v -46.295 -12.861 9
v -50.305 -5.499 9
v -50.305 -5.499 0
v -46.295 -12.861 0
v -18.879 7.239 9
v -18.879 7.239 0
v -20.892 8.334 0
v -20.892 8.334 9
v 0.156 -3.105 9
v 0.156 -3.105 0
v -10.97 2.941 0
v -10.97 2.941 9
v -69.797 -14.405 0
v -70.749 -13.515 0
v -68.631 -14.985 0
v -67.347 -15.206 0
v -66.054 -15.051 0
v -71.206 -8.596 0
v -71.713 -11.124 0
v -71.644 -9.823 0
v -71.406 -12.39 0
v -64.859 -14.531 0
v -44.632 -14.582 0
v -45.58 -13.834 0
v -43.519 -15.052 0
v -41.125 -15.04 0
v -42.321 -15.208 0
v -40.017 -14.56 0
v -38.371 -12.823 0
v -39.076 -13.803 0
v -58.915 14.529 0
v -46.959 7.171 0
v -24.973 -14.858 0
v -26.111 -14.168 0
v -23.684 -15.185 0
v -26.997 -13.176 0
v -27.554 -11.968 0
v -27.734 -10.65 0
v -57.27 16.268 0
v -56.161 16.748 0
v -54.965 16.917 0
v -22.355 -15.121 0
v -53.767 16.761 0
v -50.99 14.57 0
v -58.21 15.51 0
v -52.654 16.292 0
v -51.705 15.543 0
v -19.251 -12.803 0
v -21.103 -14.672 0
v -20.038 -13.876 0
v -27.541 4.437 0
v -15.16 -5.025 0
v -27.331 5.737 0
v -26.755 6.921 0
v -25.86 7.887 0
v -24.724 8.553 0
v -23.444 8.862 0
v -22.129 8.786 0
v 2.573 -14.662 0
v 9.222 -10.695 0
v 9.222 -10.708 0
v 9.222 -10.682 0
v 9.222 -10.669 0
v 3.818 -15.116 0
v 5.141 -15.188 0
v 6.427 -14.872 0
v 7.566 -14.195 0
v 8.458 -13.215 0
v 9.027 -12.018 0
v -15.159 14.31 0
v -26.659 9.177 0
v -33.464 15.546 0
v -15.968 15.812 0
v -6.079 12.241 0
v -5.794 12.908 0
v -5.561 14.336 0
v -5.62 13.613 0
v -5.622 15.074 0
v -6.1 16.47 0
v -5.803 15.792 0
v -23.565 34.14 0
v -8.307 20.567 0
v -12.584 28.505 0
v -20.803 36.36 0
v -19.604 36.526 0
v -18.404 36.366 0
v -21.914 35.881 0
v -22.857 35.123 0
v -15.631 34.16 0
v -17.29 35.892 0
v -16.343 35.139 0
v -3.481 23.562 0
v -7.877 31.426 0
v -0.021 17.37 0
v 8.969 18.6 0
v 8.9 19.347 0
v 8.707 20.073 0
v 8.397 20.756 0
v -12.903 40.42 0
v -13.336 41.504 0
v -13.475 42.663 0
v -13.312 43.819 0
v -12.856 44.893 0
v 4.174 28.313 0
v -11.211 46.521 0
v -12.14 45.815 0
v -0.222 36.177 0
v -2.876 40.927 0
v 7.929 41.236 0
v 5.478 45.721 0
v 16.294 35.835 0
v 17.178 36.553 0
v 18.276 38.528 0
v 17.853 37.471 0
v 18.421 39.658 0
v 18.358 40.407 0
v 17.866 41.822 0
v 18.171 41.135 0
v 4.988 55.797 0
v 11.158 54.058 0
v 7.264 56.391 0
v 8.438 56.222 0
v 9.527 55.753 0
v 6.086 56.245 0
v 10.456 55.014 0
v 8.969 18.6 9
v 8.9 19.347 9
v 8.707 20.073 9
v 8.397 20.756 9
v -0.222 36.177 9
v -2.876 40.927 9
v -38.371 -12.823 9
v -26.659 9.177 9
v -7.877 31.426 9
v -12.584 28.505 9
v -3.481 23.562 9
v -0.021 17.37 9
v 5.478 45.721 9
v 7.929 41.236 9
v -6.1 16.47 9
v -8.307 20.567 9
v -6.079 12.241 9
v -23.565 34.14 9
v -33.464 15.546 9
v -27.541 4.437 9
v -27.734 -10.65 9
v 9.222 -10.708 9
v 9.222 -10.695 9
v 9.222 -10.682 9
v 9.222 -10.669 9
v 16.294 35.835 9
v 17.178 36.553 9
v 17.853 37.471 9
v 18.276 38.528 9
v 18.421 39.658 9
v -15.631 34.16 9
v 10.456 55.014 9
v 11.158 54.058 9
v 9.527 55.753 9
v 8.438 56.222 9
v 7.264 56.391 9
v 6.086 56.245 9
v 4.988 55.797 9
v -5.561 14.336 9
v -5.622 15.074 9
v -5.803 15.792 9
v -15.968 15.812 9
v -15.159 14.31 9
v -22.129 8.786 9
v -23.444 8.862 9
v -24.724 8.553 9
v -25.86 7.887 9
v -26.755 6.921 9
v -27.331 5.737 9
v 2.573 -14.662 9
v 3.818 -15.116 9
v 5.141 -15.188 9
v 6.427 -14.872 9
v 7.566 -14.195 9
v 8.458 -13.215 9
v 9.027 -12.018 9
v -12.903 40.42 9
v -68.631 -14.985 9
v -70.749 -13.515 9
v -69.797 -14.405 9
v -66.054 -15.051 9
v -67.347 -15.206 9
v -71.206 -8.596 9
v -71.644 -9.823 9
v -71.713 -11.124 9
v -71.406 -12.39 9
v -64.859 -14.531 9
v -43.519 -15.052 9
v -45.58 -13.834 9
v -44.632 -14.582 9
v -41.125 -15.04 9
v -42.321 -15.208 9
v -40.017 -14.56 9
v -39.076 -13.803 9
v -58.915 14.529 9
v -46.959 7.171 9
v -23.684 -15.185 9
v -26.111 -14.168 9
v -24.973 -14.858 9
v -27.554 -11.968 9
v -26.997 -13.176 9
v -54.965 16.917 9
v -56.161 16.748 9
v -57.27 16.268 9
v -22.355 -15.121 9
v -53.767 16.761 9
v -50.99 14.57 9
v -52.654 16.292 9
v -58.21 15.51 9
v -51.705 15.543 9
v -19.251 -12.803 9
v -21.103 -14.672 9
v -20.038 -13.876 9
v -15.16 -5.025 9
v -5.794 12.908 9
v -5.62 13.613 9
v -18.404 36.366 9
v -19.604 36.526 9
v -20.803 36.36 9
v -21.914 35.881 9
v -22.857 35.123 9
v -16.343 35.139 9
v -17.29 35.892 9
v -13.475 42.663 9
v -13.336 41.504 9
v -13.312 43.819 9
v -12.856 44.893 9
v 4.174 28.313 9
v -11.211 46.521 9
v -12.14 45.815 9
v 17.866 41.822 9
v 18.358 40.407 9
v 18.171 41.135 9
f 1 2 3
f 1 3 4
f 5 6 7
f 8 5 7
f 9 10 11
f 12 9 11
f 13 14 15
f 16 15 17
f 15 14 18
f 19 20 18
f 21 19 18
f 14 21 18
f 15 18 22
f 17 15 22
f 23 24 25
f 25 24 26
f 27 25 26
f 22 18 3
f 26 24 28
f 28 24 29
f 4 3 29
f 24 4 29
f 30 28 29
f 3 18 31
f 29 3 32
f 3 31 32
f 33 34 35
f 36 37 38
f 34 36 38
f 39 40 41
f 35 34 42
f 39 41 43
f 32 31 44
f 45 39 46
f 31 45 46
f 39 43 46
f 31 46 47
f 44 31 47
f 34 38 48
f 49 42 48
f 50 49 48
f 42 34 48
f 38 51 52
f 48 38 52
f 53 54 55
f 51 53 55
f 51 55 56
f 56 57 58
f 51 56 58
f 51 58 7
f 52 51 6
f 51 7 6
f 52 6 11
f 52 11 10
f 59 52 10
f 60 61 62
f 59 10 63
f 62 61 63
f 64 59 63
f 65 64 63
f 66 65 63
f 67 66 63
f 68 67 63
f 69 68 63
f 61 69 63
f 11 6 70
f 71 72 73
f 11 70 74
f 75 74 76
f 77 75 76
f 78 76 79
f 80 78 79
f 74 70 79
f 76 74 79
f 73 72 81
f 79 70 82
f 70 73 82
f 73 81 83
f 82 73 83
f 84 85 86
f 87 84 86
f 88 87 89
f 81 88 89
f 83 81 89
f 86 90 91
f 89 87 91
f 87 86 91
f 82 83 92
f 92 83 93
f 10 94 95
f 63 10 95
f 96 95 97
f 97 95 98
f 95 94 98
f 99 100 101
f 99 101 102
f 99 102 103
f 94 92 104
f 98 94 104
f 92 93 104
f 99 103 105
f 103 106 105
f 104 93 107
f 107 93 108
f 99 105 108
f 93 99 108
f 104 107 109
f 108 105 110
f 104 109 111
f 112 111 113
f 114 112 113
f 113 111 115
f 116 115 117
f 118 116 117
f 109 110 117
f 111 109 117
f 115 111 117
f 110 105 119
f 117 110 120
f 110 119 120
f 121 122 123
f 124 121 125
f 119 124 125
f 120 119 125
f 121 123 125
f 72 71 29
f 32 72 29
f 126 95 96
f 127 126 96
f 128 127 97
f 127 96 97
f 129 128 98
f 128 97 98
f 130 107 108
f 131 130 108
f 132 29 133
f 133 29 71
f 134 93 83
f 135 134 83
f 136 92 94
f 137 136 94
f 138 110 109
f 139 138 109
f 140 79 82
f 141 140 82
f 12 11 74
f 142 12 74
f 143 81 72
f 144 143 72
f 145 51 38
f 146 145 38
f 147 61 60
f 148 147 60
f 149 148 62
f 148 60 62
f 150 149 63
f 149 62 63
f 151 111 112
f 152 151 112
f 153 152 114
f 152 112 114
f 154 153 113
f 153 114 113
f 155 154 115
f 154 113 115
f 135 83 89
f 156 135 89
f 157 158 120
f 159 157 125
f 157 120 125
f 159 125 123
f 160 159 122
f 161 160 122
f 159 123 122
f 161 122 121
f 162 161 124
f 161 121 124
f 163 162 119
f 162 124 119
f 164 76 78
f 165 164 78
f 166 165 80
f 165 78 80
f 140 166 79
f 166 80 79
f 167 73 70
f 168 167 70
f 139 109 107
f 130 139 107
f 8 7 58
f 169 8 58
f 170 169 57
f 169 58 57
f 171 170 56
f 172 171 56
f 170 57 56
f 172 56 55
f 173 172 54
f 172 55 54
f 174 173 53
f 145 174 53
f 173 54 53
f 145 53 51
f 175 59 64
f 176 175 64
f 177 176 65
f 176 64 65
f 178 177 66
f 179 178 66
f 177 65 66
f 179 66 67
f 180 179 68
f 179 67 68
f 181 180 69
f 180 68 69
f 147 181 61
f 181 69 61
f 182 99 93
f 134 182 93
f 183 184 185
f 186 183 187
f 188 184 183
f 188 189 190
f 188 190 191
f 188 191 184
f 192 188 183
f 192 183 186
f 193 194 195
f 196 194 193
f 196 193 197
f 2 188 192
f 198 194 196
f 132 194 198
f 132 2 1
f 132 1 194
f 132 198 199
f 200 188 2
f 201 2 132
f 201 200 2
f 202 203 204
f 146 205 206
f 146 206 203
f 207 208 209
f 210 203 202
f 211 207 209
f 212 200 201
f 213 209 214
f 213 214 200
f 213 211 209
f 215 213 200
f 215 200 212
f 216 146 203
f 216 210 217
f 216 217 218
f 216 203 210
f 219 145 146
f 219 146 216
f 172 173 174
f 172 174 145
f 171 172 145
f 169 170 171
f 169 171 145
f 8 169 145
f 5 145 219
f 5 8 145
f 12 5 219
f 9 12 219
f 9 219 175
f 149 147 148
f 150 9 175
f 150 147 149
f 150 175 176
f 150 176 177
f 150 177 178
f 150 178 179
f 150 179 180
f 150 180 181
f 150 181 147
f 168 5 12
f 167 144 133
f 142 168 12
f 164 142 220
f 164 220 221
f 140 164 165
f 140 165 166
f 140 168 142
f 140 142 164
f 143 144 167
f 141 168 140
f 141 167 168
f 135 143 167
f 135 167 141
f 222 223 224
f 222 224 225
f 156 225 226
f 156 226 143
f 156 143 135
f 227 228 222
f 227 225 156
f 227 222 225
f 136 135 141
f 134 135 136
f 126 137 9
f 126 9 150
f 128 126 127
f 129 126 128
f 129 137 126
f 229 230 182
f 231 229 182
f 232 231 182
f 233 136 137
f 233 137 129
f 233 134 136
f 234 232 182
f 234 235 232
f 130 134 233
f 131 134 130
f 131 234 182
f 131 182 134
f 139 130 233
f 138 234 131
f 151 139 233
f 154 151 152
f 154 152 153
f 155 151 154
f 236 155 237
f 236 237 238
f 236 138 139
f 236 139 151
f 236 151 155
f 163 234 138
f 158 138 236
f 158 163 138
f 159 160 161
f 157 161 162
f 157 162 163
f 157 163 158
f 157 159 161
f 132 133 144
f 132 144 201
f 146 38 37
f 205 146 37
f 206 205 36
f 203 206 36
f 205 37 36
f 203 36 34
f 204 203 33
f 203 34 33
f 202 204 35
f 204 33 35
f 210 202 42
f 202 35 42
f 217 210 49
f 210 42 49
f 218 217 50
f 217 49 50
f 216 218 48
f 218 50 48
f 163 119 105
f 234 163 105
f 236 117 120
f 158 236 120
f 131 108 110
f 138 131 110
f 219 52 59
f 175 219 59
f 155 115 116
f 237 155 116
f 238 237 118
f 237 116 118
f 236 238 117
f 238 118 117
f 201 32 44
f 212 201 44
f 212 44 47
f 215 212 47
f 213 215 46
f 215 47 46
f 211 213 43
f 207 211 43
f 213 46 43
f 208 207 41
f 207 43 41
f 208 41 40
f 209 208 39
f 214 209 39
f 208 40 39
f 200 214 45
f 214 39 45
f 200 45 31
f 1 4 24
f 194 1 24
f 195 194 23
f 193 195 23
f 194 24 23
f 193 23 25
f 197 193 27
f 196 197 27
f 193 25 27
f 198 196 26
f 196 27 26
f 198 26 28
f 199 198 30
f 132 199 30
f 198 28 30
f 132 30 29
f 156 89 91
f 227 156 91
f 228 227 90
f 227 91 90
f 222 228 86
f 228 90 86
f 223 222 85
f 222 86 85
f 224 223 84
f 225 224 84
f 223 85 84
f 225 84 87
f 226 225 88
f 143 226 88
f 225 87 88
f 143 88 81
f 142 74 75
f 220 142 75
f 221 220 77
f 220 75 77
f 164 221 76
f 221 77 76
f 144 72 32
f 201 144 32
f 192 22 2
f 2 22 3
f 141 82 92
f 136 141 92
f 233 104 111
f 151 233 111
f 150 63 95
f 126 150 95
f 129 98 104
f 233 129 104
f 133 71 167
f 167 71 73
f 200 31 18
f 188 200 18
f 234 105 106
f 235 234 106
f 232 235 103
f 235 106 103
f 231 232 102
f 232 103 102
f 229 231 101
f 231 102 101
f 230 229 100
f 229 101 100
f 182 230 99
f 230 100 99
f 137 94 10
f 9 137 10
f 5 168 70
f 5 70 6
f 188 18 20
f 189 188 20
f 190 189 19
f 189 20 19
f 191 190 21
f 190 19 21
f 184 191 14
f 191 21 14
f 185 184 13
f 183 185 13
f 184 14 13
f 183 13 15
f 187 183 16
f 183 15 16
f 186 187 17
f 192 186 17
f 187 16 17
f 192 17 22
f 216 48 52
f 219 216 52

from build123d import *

# Parameters (mm, degrees)
F1_DEPTH = 9


with BuildPart() as f1:
    # F0 (on Top) → F1 (new body)
    with BuildSketch(Plane.XY):
        with BuildLine():
            ThreePointArc((-69.6048887702, -6.8844657511), (-70.5185796828, -7.6342220802), (-71.2055353566, -8.596021196))
            ThreePointArc((-71.2055353566, -8.596021196), (-70.3056022489, -13.9946183424), (-64.8588968993, -14.5313972377))
            ThreePointArc((-64.8588968993, -14.5313972377), (-63.9452059866, -13.7816409086), (-63.2582503128, -12.8198417928))
            ThreePointArc((-63.2582503128, -12.8198417928), (-62.8654645834, -11.7961889666), (-62.7318928347, -10.7079314944))
            ThreePointArc((-62.7318928347, -10.7079314944), (-65.0442550344, -6.7754715957), (-69.6048887702, -6.8844657511))
        make_face()
        with BuildLine():
            Line((-63.2582503128, -12.8198417928), (-55.4270514125, 1.9148678069))
            Line((-55.4270514125, 1.9148678069), (-69.6048887702, -6.8844657511))
            ThreePointArc((-69.6048887702, -6.8844657511), (-65.0442550344, -6.7754715957), (-62.7318928347, -10.7079314944))
            ThreePointArc((-62.7318928347, -10.7079314944), (-62.8654645834, -11.7961889666), (-63.2582503128, -12.8198417928))
        make_face()
        with BuildLine():
            ThreePointArc((-58.8932094419, 10.2638252445), (-59.4415558397, 12.3934443823), (-58.9152585008, 14.5286194466))
            Line((-58.9152585008, 14.5286194466), (-71.2055353566, -8.596021196))
            ThreePointArc((-71.2055353566, -8.596021196), (-70.5185796828, -7.6342220802), (-69.6048887702, -6.8844657511))
            Line((-69.6048887702, -6.8844657511), (-55.4270514125, 1.9148678069))
            Line((-55.4270514125, 1.9148678069), (-54.8925209734, 2.9206079104))
            Line((-54.8925209734, 2.9206079104), (-58.8932094419, 10.2638252445))
        make_face()
        with BuildLine():
            Line((-54.8925209734, 2.9206079104), (-50.967973457, 10.3047988498))
            ThreePointArc((-50.967973457, 10.3047988498), (-54.918351213, 7.9167692874), (-58.8932094419, 10.2638252445))
            Line((-58.8932094419, 10.2638252445), (-54.8925209734, 2.9206079104))
        make_face()
        with BuildLine():
            ThreePointArc((-50.967973457, 10.3047988498), (-50.5751877275, 11.328451676), (-50.4416159789, 12.4167091482))
            ThreePointArc((-50.4416159789, 12.4167091482), (-50.5808723162, 13.5275262835), (-50.9900225159, 14.5695930519))
            ThreePointArc((-50.9900225159, 14.5695930519), (-54.9648807448, 16.916649009), (-58.9152585008, 14.5286194466))
            ThreePointArc((-58.9152585008, 14.5286194466), (-59.4415558397, 12.3934443823), (-58.8932094419, 10.2638252445))
            ThreePointArc((-58.8932094419, 10.2638252445), (-54.918351213, 7.9167692874), (-50.967973457, 10.3047988498))
        make_face()
        with BuildLine():
            ThreePointArc((-50.9900225159, 14.5695930519), (-50.5808723162, 13.5275262835), (-50.4416159789, 12.4167091482))
            ThreePointArc((-50.4416159789, 12.4167091482), (-50.5751877275, 11.328451676), (-50.967973457, 10.3047988498))
            Line((-50.967973457, 10.3047988498), (-54.8925209734, 2.9206079104))
            Line((-54.8925209734, 2.9206079104), (-54.6181097925, 2.4169293671))
            Line((-54.6181097925, 2.4169293671), (-46.9589111027, 7.1705347555))
            Line((-46.9589111027, 7.1705347555), (-50.9900225159, 14.5695930519))
        make_face()
        Polygon((-42.646235985, -0.7453304586), (-46.9589111027, 7.1705347555), (-54.6181097925, 2.4169293671), (-50.3054346748, -5.498935847), align=None)
        Polygon((-54.6181097925, 2.4169293671), (-54.8925209734, 2.9206079104), (-55.4270514125, 1.9148678069), align=None)
        with BuildLine():
            Line((-50.3054346748, -5.498935847), (-54.6181097925, 2.4169293671))
            Line((-54.6181097925, 2.4169293671), (-55.4270514125, 1.9148678069))
            Line((-55.4270514125, 1.9148678069), (-63.2582503128, -12.8198417928))
            ThreePointArc((-63.2582503128, -12.8198417928), (-63.9452059866, -13.7816409086), (-64.8588968993, -14.5313972377))
            Line((-64.8588968993, -14.5313972377), (-50.3054346748, -5.498935847))
        make_face()
        Polygon((-33.4638913069, 15.546084394), (-46.9589111027, 7.1705347555), (-42.646235985, -0.7453304586), (-41.8858454209, -0.2734016278), align=None)
        with BuildLine():
            Line((-42.3887241717, -1.2179904086), (-42.646235985, -0.7453304586))
            Line((-42.646235985, -0.7453304586), (-50.3054346748, -5.498935847))
            Line((-50.3054346748, -5.498935847), (-46.294578767, -12.8608153981))
            ThreePointArc((-46.294578767, -12.8608153981), (-46.842933038, -10.7296199867), (-46.3151472997, -8.5932378807))
            Line((-46.3151472997, -8.5932378807), (-42.3887241717, -1.2179904086))
        make_face()
        Polygon((-41.8858454209, -0.2734016278), (-42.646235985, -0.7453304586), (-42.3887241717, -1.2179904086), align=None)
        with BuildLine():
            Line((-38.3913918409, -8.5550475907), (-42.3887241717, -1.2179904086))
            Line((-42.3887241717, -1.2179904086), (-46.3151472997, -8.5932378807))
            ThreePointArc((-46.3151472997, -8.5932378807), (-42.3646737963, -6.2079837603), (-38.3913918409, -8.5550475907))
        make_face()
        with BuildLine():
            Line((-41.8858454209, -0.2734016278), (-42.3887241717, -1.2179904086))
            Line((-42.3887241717, -1.2179904086), (-38.3913918409, -8.5550475907))
            ThreePointArc((-38.3913918409, -8.5550475907), (-37.9822416413, -9.5971143591), (-37.842985304, -10.7079314944))
            ThreePointArc((-37.842985304, -10.7079314944), (-37.9769385234, -11.7977184046), (-38.3708233082, -12.822625108))
            Line((-38.3708233082, -12.822625108), (-26.6585553592, 9.1772642994))
            Line((-26.6585553592, 9.1772642994), (-41.8858454209, -0.2734016278))
        make_face()
        Polygon((-20.2453090448, 23.7500658302), (-33.4638913069, 15.546084394), (-41.8858454209, -0.2734016278), (-26.6585553592, 9.1772642994), (-19.5687892579, 22.4944178032), align=None)
        with BuildLine():
            ThreePointArc((-37.842985304, -10.7079314944), (-37.9822416413, -9.5971143591), (-38.3913918409, -8.5550475907))
            ThreePointArc((-38.3913918409, -8.5550475907), (-42.3646737963, -6.2079837603), (-46.3151472997, -8.5932378807))
            ThreePointArc((-46.3151472997, -8.5932378807), (-46.842933038, -10.7296199867), (-46.294578767, -12.8608153981))
            ThreePointArc((-46.294578767, -12.8608153981), (-42.3212968117, -15.2078792285), (-38.3708233082, -12.822625108))
            ThreePointArc((-38.3708233082, -12.822625108), (-37.9769385234, -11.7977184046), (-37.842985304, -10.7079314944))
        make_face()
        with BuildLine():
            ThreePointArc((-27.216644297, -8.613111165), (-27.5957324364, -9.6011379034), (-27.7335977255, -10.650374681))
            ThreePointArc((-27.7335977255, -10.650374681), (-24.3407594189, -15.0696981029), (-19.2512873589, -12.8027518237))
            ThreePointArc((-19.2512873589, -12.8027518237), (-18.8721992194, -11.8147250853), (-18.7343339304, -10.7654883078))
            ThreePointArc((-18.7343339304, -10.7654883078), (-18.7340578545, -10.7367104896), (-18.7339658279, -10.7079314944))
            ThreePointArc((-18.7339658279, -10.7079314944), (-22.1550898181, -6.3391757728), (-27.216644297, -8.613111165))
        make_face()
        with BuildLine():
            Line((-18.6367336981, -3.1353730797), (-23.0686211662, -0.7268775915))
            Line((-23.0686211662, -0.7268775915), (-27.216644297, -8.613111165))
            ThreePointArc((-27.216644297, -8.613111165), (-22.1550898181, -6.3391757728), (-18.7339658279, -10.7079314944))
            ThreePointArc((-18.7339658279, -10.7079314944), (-18.7340578545, -10.7367104896), (-18.7343339304, -10.7654883078))
            Line((-18.7343339304, -10.7654883078), (-18.6367336981, -3.1353730797))
        make_face()
        with BuildLine():
            ThreePointArc((-25.1896877217, 0.4258094445), (-26.9233693413, 2.1043690059), (-27.5406054129, 4.4372285797))
            Line((-27.5406054129, 4.4372285797), (-27.7335977255, -10.650374681))
            ThreePointArc((-27.7335977255, -10.650374681), (-27.5957324364, -9.6011379034), (-27.216644297, -8.613111165))
            Line((-27.216644297, -8.613111165), (-23.0686211662, -0.7268775915))
            Line((-23.0686211662, -0.7268775915), (-25.1896877217, 0.4258094445))
        make_face()
        with BuildLine():
            Line((-23.0686211662, -0.7268775915), (-22.744442151, -0.1105475101))
            ThreePointArc((-22.744442151, -0.1105475101), (-24.0051130362, -0.0158299098), (-25.1896877217, 0.4258094445))
            Line((-25.1896877217, 0.4258094445), (-23.0686211662, -0.7268775915))
        make_face()
        with BuildLine():
            Line((-22.744442151, -0.1105475101), (-19.1730228604, 6.6794451748))
            ThreePointArc((-19.1730228604, 6.6794451748), (-19.9210269539, 7.6224997687), (-20.8922593091, 8.3335340881))
            ThreePointArc((-20.8922593091, 8.3335340881), (-25.3162762758, 8.2620675921), (-27.5406054129, 4.4372285797))
            ThreePointArc((-27.5406054129, 4.4372285797), (-26.9233693413, 2.1043690059), (-25.1896877217, 0.4258094445))
            ThreePointArc((-25.1896877217, 0.4258094445), (-24.0051130362, -0.0158299098), (-22.744442151, -0.1105475101))
        make_face()
        with BuildLine():
            ThreePointArc((-18.5409735154, 4.3796717663), (-18.7018619734, 5.572194733), (-19.1730228604, 6.6794451748))
            Line((-19.1730228604, 6.6794451748), (-22.744442151, -0.1105475101))
            ThreePointArc((-22.744442151, -0.1105475101), (-19.7755608866, 1.2833706886), (-18.5413416179, 4.3221149529))
            ThreePointArc((-18.5413416179, 4.3221149529), (-18.541065542, 4.350892771), (-18.5409735154, 4.3796717663))
        make_face()
        with BuildLine():
            ThreePointArc((-18.5413416179, 4.3221149529), (-19.7755608866, 1.2833706886), (-22.744442151, -0.1105475101))
            Line((-22.744442151, -0.1105475101), (-23.0686211662, -0.7268775915))
            Line((-23.0686211662, -0.7268775915), (-18.6367336981, -3.1353730797))
            Line((-18.6367336981, -3.1353730797), (-18.5413416179, 4.3221149529))
        make_face()
        with BuildLine():
            Line((-10.9701401389, 2.9413892225), (-18.8785941021, 7.2392139816))
            Line((-18.8785941021, 7.2392139816), (-19.1730228604, 6.6794451748))
            ThreePointArc((-19.1730228604, 6.6794451748), (-18.7018619734, 5.572194733), (-18.5409735154, 4.3796717663))
            ThreePointArc((-18.5409735154, 4.3796717663), (-18.541065542, 4.350892771), (-18.5413416179, 4.3221149529))
            Line((-18.5413416179, 4.3221149529), (-18.6367336981, -3.1353730797))
            Line((-18.6367336981, -3.1353730797), (-15.160167203, -5.0247023505))
            Line((-15.160167203, -5.0247023505), (-10.9701401389, 2.9413892225))
        make_face()
        with BuildLine():
            Line((0.1559297945, -3.1050389482), (-10.9701401389, 2.9413892225))
            Line((-10.9701401389, 2.9413892225), (-15.160167203, -5.0247023505))
            Line((-15.160167203, -5.0247023505), (2.5731045027, -14.6617938162))
            ThreePointArc((2.5731045027, -14.6617938162), (0.8640306217, -13.0247118192), (0.2219868238, -10.746828864))
            Line((0.2219868238, -10.746828864), (0.1559297945, -3.1050389482))
        make_face()
        with BuildLine():
            Line((6.8705329153, -6.7540691726), (0.1559297945, -3.1050389482))
            Line((0.1559297945, -3.1050389482), (0.2219868238, -10.746828864))
            ThreePointArc((0.2219868238, -10.746828864), (2.4050383842, -6.8501434071), (6.8705329153, -6.7540691726))
        make_face()
        with BuildLine():
            Line((-19.1730228604, 6.6794451748), (-18.8785941021, 7.2392139816))
            Line((-18.8785941021, 7.2392139816), (-20.8922593091, 8.3335340881))
            ThreePointArc((-20.8922593091, 8.3335340881), (-19.9210269539, 7.6224997687), (-19.1730228604, 6.6794451748))
        make_face()
        with BuildLine():
            Line((-14.0230348329, 12.2012737804), (-15.1593316453, 14.3102865218))
            Line((-15.1593316453, 14.3102865218), (-18.8785941021, 7.2392139816))
            Line((-18.8785941021, 7.2392139816), (-10.9701401389, 2.9413892225))
            Line((-10.9701401389, 2.9413892225), (-6.0787654687, 12.2408848928))
            ThreePointArc((-6.0787654687, 12.2408848928), (-10.0390066586, 9.8357611593), (-14.0230348329, 12.2012737804))
        make_face()
        with BuildLine():
            Line((-14.0441224068, 16.4305255515), (-15.1593316453, 14.3102865218))
            Line((-15.1593316453, 14.3102865218), (-14.0230348329, 12.2012737804))
            ThreePointArc((-14.0230348329, 12.2012737804), (-14.5613880006, 14.3132679429), (-14.0441224068, 16.4305255515))
        make_face()
        with BuildLine():
            Line((-13.2803807774, 17.4802951195), (-15.9684212864, 15.811989548))
            Line((-15.9684212864, 15.811989548), (-15.1593316453, 14.3102865218))
            Line((-15.1593316453, 14.3102865218), (-14.0441224068, 16.4305255515))
            ThreePointArc((-14.0441224068, 16.4305255515), (-13.7003063699, 16.9830964286), (-13.2803807774, 17.4802951195))
        make_face()
        with BuildLine():
            Line((-11.4506321909, 18.6159103571), (-13.2803807774, 17.4802951195))
            ThreePointArc((-13.2803807774, 17.4802951195), (-13.7003063699, 16.9830964286), (-14.0441224068, 16.4305255515))
            ThreePointArc((-14.0441224068, 16.4305255515), (-14.5613880006, 14.3132679429), (-14.0230348329, 12.2012737804))
            ThreePointArc((-14.0230348329, 12.2012737804), (-10.0390066586, 9.8357611593), (-6.0787654687, 12.2408848928))
            ThreePointArc((-6.0787654687, 12.2408848928), (-5.6926882161, 13.2568292123), (-5.5614439378, 14.3357052222))
            ThreePointArc((-5.5614439378, 14.3357052222), (-5.6981218646, 15.4363507082), (-6.0998530426, 16.4701366639))
            ThreePointArc((-6.0998530426, 16.4701366639), (-8.3865110962, 18.5123785367), (-11.4506321909, 18.6159103571))
        make_face()
        Polygon((-18.2366012452, 24.9967503211), (-20.2453090448, 23.7500658302), (-19.5687892579, 22.4944178032), align=None)
        with BuildLine():
            Line((-23.5540924439, 29.8913013515), (-20.2453090448, 23.7500658302))
            Line((-20.2453090448, 23.7500658302), (-18.2366012452, 24.9967503211))
            Line((-18.2366012452, 24.9967503211), (-15.620339553, 29.9110391796))
            ThreePointArc((-15.620339553, 29.9110391796), (-19.5813063486, 27.5257467191), (-23.5540924439, 29.8913013515))
        make_face()
        with BuildLine():
            Line((-23.5646635445, 34.1404264069), (-33.4638913069, 15.546084394))
            Line((-33.4638913069, 15.546084394), (-20.2453090448, 23.7500658302))
            Line((-20.2453090448, 23.7500658302), (-23.5540924439, 29.8913013515))
            ThreePointArc((-23.5540924439, 29.8913013515), (-24.0924876229, 32.0145375931), (-23.5646635445, 34.1404264069))
        make_face()
        with BuildLine():
            ThreePointArc((-15.6309106536, 34.160164235), (-19.6036967489, 36.5257188674), (-23.5646635445, 34.1404264069))
            ThreePointArc((-23.5646635445, 34.1404264069), (-24.0924876229, 32.0145375931), (-23.5540924439, 29.8913013515))
            ThreePointArc((-23.5540924439, 29.8913013515), (-19.5813063486, 27.5257467191), (-15.620339553, 29.9110391796))
            ThreePointArc((-15.620339553, 29.9110391796), (-15.2264547682, 30.9359458831), (-15.0925015488, 32.0257327933))
            ThreePointArc((-15.0925015488, 32.0257327933), (-15.2291794756, 33.1263782793), (-15.6309106536, 34.160164235))
        make_face()
        with BuildLine():
            Line((-15.620339553, 29.9110391796), (-18.2366012452, 24.9967503211))
            Line((-18.2366012452, 24.9967503211), (-12.5840023789, 28.5049795129))
            Line((-12.5840023789, 28.5049795129), (-15.6309106536, 34.160164235))
            ThreePointArc((-15.6309106536, 34.160164235), (-15.2291794756, 33.1263782793), (-15.0925015488, 32.0257327933))
            ThreePointArc((-15.0925015488, 32.0257327933), (-15.2264547682, 30.9359458831), (-15.620339553, 29.9110391796))
        make_face()
        with BuildLine():
            Line((-12.5840023789, 28.5049795129), (-18.2366012452, 24.9967503211))
            Line((-18.2366012452, 24.9967503211), (-19.5687892579, 22.4944178032))
            Line((-19.5687892579, 22.4944178032), (-15.9684212864, 15.811989548))
            Line((-15.9684212864, 15.811989548), (-13.2803807774, 17.4802951195))
            ThreePointArc((-13.2803807774, 17.4802951195), (-12.4344398732, 18.1591709655), (-11.4506321909, 18.6159103571))
            Line((-11.4506321909, 18.6159103571), (-8.3071146204, 20.5669032308))
            Line((-8.3071146204, 20.5669032308), (-12.5840023789, 28.5049795129))
        make_face()
        Polygon((-7.8767613739, 31.4264817629), (-12.5840023789, 28.5049795129), (-8.3071146204, 20.5669032308), (-3.4813896424, 23.5619413787), align=None)
        with BuildLine():
            Line((-12.9033706879, 40.4204814427), (-7.8767613739, 31.4264817629))
            Line((-7.8767613739, 31.4264817629), (-0.2217959499, 36.1774598171))
            Line((-0.2217959499, 36.1774598171), (-2.8763679981, 40.9272262422))
            Line((-2.8763679981, 40.9272262422), (-6.73561101, 38.7127699641))
            ThreePointArc((-6.73561101, 38.7127699641), (-10.1759981621, 38.2790244557), (-12.9033706879, 40.4204814427))
        make_face()
        with BuildLine():
            ThreePointArc((-11.2113578763, 46.5209498956), (-13.3115272854, 43.8185676227), (-12.9033706879, 40.4204814427))
            ThreePointArc((-12.9033706879, 40.4204814427), (-10.1759981621, 38.2790244557), (-6.73561101, 38.7127699641))
            ThreePointArc((-6.73561101, 38.7127699641), (-5.0811117548, 40.3606750133), (-4.4752274396, 42.6158608224))
            ThreePointArc((-4.4752274396, 42.6158608224), (-4.6205377482, 43.7501789839), (-5.0470841913, 44.8112402022))
            ThreePointArc((-5.0470841913, 44.8112402022), (-7.7725206392, 46.9521606682), (-11.2113578763, 46.5209498956))
        make_face()
        with BuildLine():
            Line((-6.73561101, 38.7127699641), (-2.8763679981, 40.9272262422))
            Line((-2.8763679981, 40.9272262422), (-5.0470841913, 44.8112402022))
            ThreePointArc((-5.0470841913, 44.8112402022), (-4.6205377482, 43.7501789839), (-4.4752274396, 42.6158608224))
            ThreePointArc((-4.4752274396, 42.6158608224), (-5.0811117548, 40.3606750133), (-6.73561101, 38.7127699641))
        make_face()
        with BuildLine():
            Line((-5.0470841913, 44.8112402022), (-2.8763679981, 40.9272262422))
            Line((-2.8763679981, 40.9272262422), (5.4780121385, 45.7210185702))
            Line((5.4780121385, 45.7210185702), (3.2785500091, 49.744594914))
            ThreePointArc((3.2785500091, 49.744594914), (2.8971985794, 53.1198072058), (4.9878029423, 55.7969064429))
            Line((4.9878029423, 55.7969064429), (-11.2113578763, 46.5209498956))
            ThreePointArc((-11.2113578763, 46.5209498956), (-7.7725206392, 46.9521606682), (-5.0470841913, 44.8112402022))
        make_face()
        with BuildLine():
            Line((3.2785500091, 49.744594914), (5.4780121385, 45.7210185702))
            Line((5.4780121385, 45.7210185702), (9.4552607777, 48.0031871694))
            ThreePointArc((9.4552607777, 48.0031871694), (6.0009643953, 47.5759114557), (3.2785500091, 49.744594914))
        make_face()
        with BuildLine():
            ThreePointArc((11.158458001, 54.058210215), (8.437967996, 56.2223713499), (4.9878029423, 55.7969064429))
            ThreePointArc((4.9878029423, 55.7969064429), (2.8971985794, 53.1198072058), (3.2785500091, 49.744594914))
            ThreePointArc((3.2785500091, 49.744594914), (6.0009643953, 47.5759114557), (9.4552607777, 48.0031871694))
            ThreePointArc((9.4552607777, 48.0031871694), (11.1066959196, 49.6480403177), (11.7114581441, 51.899049549))
            ThreePointArc((11.7114581441, 51.899049549), (11.5710123736, 53.0134758521), (11.158458001, 54.058210215))
        make_face()
        with BuildLine():
            Line((5.4780121385, 45.7210185702), (7.9294671819, 41.2364601009))
            Line((7.9294671819, 41.2364601009), (11.5475126449, 43.4819639851))
            ThreePointArc((11.5475126449, 43.4819639851), (15.0640613644, 44.0107720188), (17.8664823872, 41.8216650674))
            Line((17.8664823872, 41.8216650674), (11.158458001, 54.058210215))
            ThreePointArc((11.158458001, 54.058210215), (11.5710123736, 53.0134758521), (11.7114581441, 51.899049549))
            ThreePointArc((11.7114581441, 51.899049549), (11.1066959196, 49.6480403177), (9.4552607777, 48.0031871694))
            Line((9.4552607777, 48.0031871694), (5.4780121385, 45.7210185702))
        make_face()
        with BuildLine():
            Line((11.5475126449, 43.4819639851), (7.9294671819, 41.2364601009))
            Line((7.9294671819, 41.2364601009), (9.9719538205, 37.5000461787))
            ThreePointArc((9.9719538205, 37.5000461787), (9.5689185308, 40.8046500821), (11.5475126449, 43.4819639851))
        make_face()
        with BuildLine():
            ThreePointArc((17.8664823872, 41.8216650674), (15.0640613644, 44.0107720188), (11.5475126449, 43.4819639851))
            ThreePointArc((11.5475126449, 43.4819639851), (9.5689185308, 40.8046500821), (9.9719538205, 37.5000461787))
            ThreePointArc((9.9719538205, 37.5000461787), (12.77435674, 35.3069081923), (16.2935045158, 35.8350324985))
            ThreePointArc((16.2935045158, 35.8350324985), (17.852968479, 37.4708604415), (18.4205085803, 39.6584982418))
            ThreePointArc((18.4205085803, 39.6584982418), (18.2798022233, 40.7749922787), (17.8664823872, 41.8216650674))
        make_face()
        with BuildLine():
            Line((7.9294671819, 41.2364601009), (-0.2217959499, 36.1774598171))
            Line((-0.2217959499, 36.1774598171), (4.1735757817, 28.3129194328))
            Line((4.1735757817, 28.3129194328), (16.2935045158, 35.8350324985))
            ThreePointArc((16.2935045158, 35.8350324985), (12.77435674, 35.3069081923), (9.9719538205, 37.5000461787))
            Line((9.9719538205, 37.5000461787), (7.9294671819, 41.2364601009))
        make_face()
        with BuildLine():
            ThreePointArc((-11.4506321909, 18.6159103571), (-12.4344398732, 18.1591709655), (-13.2803807774, 17.4802951195))
            Line((-13.2803807774, 17.4802951195), (-11.4506321909, 18.6159103571))
        make_face()
        Polygon((-0.2217959499, 36.1774598171), (-7.8767613739, 31.4264817629), (-3.4813896424, 23.5619413787), (4.1735757817, 28.3129194328), align=None)
        with BuildLine():
            Line((4.1735757817, 28.3129194328), (-3.4813896424, 23.5619413787))
            Line((-3.4813896424, 23.5619413787), (-0.0210641479, 17.370458324))
            Line((-0.0210641479, 17.370458324), (-0.0310168917, 18.5218388579))
            ThreePointArc((-0.0310168917, 18.5218388579), (3.3156865866, 22.9104827578), (8.3969582417, 20.7561156073))
            Line((8.3969582417, 20.7561156073), (4.1735757817, 28.3129194328))
        make_face()
        with BuildLine():
            ThreePointArc((8.9686468786, 18.5996335972), (8.8185615237, 19.7138646343), (8.3969582417, 20.7561156073))
            ThreePointArc((8.3969582417, 20.7561156073), (3.3156865866, 22.9104827578), (-0.0310168917, 18.5218388579))
            ThreePointArc((-0.0310168917, 18.5218388579), (0.1190684632, 17.4076078208), (0.5406717451, 16.3653568478))
            ThreePointArc((0.5406717451, 16.3653568478), (5.6031331548, 14.2060465361), (8.9688149934, 18.5607362276))
            ThreePointArc((8.9688149934, 18.5607362276), (8.9687729645, 18.580185094), (8.9686468786, 18.5996335972))
        make_face()
        with BuildLine():
            Line((0.5406717451, 16.3653568478), (-0.0210641479, 17.370458324))
            Line((-0.0210641479, 17.370458324), (0.1559297945, -3.1050389482))
            Line((0.1559297945, -3.1050389482), (6.8705329153, -6.7540691726))
            ThreePointArc((6.8705329153, -6.7540691726), (8.5796067963, -8.3911511696), (9.2216505941, -10.6690341248))
            Line((9.2216505941, -10.6690341248), (8.9686468786, 18.5996335972))
            ThreePointArc((8.9686468786, 18.5996335972), (8.9687729645, 18.580185094), (8.9688149934, 18.5607362276))
            ThreePointArc((8.9688149934, 18.5607362276), (5.6031331548, 14.2060465361), (0.5406717451, 16.3653568478))
        make_face()
        with BuildLine():
            ThreePointArc((0.2219868238, -10.746828864), (0.8640306217, -13.0247118192), (2.5731045027, -14.6617938162))
            ThreePointArc((2.5731045027, -14.6617938162), (7.02190415, -14.5756966067), (9.221818709, -10.7079314944))
            ThreePointArc((9.221818709, -10.7079314944), (9.2217766801, -10.6884826279), (9.2216505941, -10.6690341248))
            ThreePointArc((9.2216505941, -10.6690341248), (8.5796067963, -8.3911511696), (6.8705329153, -6.7540691726))
            ThreePointArc((6.8705329153, -6.7540691726), (2.4050383842, -6.8501434071), (0.2219868238, -10.746828864))
        make_face()
        with BuildLine():
            Line((-0.0310168917, 18.5218388579), (-0.0210641479, 17.370458324))
            Line((-0.0210641479, 17.370458324), (0.5406717451, 16.3653568478))
            ThreePointArc((0.5406717451, 16.3653568478), (0.1190684632, 17.4076078208), (-0.0310168917, 18.5218388579))
        make_face()
        with BuildLine():
            Line((-6.0998530426, 16.4701366639), (-8.3071146204, 20.5669032308))
            Line((-8.3071146204, 20.5669032308), (-11.4506321909, 18.6159103571))
            ThreePointArc((-11.4506321909, 18.6159103571), (-8.3865110962, 18.5123785367), (-6.0998530426, 16.4701366639))
        make_face()
        Polygon((-19.5687892579, 22.4944178032), (-26.6585553592, 9.1772642994), (-15.9684212864, 15.811989548), align=None)
        with BuildLine():
            Line((-19.2512873589, -12.8027518237), (-15.160167203, -5.0247023505))
            Line((-15.160167203, -5.0247023505), (-18.6367336981, -3.1353730797))
            Line((-18.6367336981, -3.1353730797), (-18.7343339304, -10.7654883078))
            ThreePointArc((-18.7343339304, -10.7654883078), (-18.8721992194, -11.8147250853), (-19.2512873589, -12.8027518237))
        make_face()
    extrude(amount=F1_DEPTH)


solid = f1.part
